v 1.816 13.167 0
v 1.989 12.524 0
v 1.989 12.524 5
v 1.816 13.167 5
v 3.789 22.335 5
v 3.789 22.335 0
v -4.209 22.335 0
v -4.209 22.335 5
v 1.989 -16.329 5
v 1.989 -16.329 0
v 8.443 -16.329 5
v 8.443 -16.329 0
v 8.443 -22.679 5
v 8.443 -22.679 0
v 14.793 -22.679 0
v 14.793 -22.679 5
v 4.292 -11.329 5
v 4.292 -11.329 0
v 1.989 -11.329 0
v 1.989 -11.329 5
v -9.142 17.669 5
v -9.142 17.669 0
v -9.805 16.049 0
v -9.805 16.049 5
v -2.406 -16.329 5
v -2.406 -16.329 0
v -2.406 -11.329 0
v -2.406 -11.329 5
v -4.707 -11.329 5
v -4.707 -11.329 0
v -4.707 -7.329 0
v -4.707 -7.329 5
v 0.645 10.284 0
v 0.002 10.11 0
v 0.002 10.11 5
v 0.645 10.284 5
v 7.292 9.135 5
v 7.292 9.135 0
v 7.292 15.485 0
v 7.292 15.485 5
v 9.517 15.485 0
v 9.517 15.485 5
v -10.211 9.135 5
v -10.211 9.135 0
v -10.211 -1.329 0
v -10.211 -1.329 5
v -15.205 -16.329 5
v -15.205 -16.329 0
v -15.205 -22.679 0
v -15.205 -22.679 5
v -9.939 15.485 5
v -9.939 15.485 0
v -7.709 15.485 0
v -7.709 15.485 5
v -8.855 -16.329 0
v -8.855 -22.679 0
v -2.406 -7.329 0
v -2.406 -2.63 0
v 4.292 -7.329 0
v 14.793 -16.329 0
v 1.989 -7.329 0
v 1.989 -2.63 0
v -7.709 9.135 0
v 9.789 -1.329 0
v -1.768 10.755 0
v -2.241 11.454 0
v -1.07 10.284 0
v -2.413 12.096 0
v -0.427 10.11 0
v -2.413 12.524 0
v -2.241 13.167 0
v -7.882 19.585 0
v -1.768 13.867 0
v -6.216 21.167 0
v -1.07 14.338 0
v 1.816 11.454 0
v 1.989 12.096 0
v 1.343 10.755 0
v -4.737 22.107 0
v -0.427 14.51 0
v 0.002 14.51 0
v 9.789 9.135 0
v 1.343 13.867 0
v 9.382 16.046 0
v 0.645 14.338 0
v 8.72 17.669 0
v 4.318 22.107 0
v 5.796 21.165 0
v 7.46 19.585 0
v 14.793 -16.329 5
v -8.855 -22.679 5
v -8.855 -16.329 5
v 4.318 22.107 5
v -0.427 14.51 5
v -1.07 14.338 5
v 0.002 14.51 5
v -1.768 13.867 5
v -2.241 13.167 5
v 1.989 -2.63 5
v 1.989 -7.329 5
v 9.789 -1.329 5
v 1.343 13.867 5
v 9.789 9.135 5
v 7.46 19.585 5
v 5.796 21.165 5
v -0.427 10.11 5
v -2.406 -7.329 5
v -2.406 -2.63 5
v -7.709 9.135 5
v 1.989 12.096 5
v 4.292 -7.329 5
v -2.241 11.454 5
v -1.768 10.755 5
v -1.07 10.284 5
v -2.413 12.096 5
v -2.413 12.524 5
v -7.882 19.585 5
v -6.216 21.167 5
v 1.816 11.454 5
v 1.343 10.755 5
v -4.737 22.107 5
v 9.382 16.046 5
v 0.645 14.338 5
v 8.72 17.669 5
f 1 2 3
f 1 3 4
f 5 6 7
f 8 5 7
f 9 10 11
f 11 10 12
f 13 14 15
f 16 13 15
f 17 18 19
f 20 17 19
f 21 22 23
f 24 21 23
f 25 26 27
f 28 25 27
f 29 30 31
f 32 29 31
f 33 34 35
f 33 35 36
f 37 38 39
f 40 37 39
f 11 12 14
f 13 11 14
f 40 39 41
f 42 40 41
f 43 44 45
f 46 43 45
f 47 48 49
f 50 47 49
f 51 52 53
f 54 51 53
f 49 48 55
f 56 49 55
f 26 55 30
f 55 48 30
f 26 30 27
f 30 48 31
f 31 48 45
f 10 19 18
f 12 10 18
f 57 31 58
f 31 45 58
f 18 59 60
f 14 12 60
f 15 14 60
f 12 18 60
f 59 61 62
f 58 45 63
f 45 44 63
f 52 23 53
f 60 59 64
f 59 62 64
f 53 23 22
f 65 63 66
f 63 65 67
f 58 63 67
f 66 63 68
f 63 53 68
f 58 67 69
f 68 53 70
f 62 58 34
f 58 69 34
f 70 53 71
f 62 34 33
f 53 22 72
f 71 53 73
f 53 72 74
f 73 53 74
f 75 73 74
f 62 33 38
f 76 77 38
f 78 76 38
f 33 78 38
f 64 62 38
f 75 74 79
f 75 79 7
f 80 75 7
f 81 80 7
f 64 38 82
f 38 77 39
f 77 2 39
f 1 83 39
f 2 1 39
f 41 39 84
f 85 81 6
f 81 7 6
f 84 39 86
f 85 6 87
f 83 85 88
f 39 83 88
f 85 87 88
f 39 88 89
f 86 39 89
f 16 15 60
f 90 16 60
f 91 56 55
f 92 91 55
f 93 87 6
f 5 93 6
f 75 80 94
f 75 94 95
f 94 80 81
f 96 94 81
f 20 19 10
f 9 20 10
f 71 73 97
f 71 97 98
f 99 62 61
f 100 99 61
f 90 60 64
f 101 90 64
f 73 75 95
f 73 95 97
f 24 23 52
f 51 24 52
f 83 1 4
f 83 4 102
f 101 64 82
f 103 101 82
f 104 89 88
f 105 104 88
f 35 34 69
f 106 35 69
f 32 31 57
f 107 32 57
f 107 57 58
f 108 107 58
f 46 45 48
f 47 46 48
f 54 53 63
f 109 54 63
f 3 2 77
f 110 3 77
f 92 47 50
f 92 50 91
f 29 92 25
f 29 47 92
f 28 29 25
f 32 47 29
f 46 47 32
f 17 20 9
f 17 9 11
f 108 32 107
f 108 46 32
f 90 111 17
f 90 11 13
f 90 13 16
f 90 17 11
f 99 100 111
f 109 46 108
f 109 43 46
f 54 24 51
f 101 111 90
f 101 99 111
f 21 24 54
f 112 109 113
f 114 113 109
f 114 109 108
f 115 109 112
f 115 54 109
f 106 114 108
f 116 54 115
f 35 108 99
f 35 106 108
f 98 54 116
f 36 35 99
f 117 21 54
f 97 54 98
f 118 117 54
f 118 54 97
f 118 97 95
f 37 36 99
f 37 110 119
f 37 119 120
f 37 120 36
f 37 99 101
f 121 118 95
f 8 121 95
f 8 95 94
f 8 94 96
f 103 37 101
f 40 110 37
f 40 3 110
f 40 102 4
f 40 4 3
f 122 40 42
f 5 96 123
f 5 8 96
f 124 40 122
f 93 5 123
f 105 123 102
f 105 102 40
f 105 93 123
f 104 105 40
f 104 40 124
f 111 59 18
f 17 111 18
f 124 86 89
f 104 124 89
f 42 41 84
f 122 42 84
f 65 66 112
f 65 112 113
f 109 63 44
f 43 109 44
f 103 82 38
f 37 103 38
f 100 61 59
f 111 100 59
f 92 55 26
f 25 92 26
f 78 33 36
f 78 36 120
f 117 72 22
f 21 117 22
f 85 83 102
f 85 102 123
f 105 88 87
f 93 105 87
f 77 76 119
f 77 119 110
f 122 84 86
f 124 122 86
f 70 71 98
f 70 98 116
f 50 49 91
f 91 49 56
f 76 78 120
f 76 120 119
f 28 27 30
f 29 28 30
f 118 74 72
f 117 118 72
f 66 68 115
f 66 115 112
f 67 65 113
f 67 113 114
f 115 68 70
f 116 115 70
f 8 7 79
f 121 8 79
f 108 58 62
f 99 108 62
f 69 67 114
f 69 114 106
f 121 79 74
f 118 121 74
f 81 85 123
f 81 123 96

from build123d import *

# Parameters (mm, degrees)
BOSS_EXTRUDE1_DEPTH = 5


with BuildPart() as part:
    # Sketch1 → Boss-Extrude1 (new body)
    with BuildSketch(Plane.XY):
        Polygon((-10.211091397, -1.328977692), (-15.204731397, -16.328947692), (-15.204731397, -22.678947692), (-8.854731397, -22.678947692), (-8.854731397, -16.328947692), (-2.405671397, -16.328947692), (-2.405671397, -11.329465692), (-4.706911397, -11.329465692), (-4.706911397, -7.328965692), (-2.405671397, -7.328965692), (-2.405671397, -2.629965692), (1.988528603, -2.629965692), (1.988528603, -7.328965692), (4.292308603, -7.328965692), (4.292308603, -11.329465692), (1.988528603, -11.329465692), (1.988528603, -16.328947692), (8.442668603, -16.328947692), (8.442668603, -22.678947692), (14.792668603, -22.678947692), (14.792668603, -16.328947692), (9.788868603, -1.328977692), (9.788868603, 9.134552308), (7.292048603, 9.134552308), (7.292048603, 15.485060308), (9.517088603, 15.485060308), (9.382468603, 16.046400308), (8.719528603, 17.669460308), (7.459688603, 19.584620308), (5.795988603, 21.164500308), (4.317708603, 22.106840308), (3.789388603, 22.335440308), (-4.209071397, 22.335440308), (-4.737391397, 22.106840308), (-6.215671397, 21.167040308), (-7.881911397, 19.584620308), (-9.141751397, 17.669460308), (-9.804691397, 16.048940308), (-9.939311397, 15.485060308), (-7.709191397, 15.485060308), (-7.709191397, 9.134552308), (-10.211091397, 9.134552308), align=None)
        Polygon((1.988528603, 12.309552308), (1.988528603, 12.524182308), (1.815808603, 13.166548308), (1.343368603, 13.866572308), (0.644868603, 14.337996308), (0.002248603, 14.509954308), (-0.211111397, 14.509954308), (-0.427011397, 14.509954308), (-1.069631397, 14.337996308), (-1.768131397, 13.866572308), (-2.240571397, 13.166548308), (-2.413291397, 12.524182308), (-2.413291397, 12.309552308), (-2.413291397, 12.095684308), (-2.240571397, 11.453572308), (-1.768131397, 10.755072308), (-1.069631397, 10.283648308), (-0.427011397, 10.110166308), (-0.211111397, 10.110166308), (0.002248603, 10.110166308), (0.644868603, 10.283648308), (1.343368603, 10.755072308), (1.815808603, 11.453572308), (1.988528603, 12.095684308), align=None, mode=Mode.SUBTRACT)
    extrude(amount=BOSS_EXTRUDE1_DEPTH)


solid = part.part
